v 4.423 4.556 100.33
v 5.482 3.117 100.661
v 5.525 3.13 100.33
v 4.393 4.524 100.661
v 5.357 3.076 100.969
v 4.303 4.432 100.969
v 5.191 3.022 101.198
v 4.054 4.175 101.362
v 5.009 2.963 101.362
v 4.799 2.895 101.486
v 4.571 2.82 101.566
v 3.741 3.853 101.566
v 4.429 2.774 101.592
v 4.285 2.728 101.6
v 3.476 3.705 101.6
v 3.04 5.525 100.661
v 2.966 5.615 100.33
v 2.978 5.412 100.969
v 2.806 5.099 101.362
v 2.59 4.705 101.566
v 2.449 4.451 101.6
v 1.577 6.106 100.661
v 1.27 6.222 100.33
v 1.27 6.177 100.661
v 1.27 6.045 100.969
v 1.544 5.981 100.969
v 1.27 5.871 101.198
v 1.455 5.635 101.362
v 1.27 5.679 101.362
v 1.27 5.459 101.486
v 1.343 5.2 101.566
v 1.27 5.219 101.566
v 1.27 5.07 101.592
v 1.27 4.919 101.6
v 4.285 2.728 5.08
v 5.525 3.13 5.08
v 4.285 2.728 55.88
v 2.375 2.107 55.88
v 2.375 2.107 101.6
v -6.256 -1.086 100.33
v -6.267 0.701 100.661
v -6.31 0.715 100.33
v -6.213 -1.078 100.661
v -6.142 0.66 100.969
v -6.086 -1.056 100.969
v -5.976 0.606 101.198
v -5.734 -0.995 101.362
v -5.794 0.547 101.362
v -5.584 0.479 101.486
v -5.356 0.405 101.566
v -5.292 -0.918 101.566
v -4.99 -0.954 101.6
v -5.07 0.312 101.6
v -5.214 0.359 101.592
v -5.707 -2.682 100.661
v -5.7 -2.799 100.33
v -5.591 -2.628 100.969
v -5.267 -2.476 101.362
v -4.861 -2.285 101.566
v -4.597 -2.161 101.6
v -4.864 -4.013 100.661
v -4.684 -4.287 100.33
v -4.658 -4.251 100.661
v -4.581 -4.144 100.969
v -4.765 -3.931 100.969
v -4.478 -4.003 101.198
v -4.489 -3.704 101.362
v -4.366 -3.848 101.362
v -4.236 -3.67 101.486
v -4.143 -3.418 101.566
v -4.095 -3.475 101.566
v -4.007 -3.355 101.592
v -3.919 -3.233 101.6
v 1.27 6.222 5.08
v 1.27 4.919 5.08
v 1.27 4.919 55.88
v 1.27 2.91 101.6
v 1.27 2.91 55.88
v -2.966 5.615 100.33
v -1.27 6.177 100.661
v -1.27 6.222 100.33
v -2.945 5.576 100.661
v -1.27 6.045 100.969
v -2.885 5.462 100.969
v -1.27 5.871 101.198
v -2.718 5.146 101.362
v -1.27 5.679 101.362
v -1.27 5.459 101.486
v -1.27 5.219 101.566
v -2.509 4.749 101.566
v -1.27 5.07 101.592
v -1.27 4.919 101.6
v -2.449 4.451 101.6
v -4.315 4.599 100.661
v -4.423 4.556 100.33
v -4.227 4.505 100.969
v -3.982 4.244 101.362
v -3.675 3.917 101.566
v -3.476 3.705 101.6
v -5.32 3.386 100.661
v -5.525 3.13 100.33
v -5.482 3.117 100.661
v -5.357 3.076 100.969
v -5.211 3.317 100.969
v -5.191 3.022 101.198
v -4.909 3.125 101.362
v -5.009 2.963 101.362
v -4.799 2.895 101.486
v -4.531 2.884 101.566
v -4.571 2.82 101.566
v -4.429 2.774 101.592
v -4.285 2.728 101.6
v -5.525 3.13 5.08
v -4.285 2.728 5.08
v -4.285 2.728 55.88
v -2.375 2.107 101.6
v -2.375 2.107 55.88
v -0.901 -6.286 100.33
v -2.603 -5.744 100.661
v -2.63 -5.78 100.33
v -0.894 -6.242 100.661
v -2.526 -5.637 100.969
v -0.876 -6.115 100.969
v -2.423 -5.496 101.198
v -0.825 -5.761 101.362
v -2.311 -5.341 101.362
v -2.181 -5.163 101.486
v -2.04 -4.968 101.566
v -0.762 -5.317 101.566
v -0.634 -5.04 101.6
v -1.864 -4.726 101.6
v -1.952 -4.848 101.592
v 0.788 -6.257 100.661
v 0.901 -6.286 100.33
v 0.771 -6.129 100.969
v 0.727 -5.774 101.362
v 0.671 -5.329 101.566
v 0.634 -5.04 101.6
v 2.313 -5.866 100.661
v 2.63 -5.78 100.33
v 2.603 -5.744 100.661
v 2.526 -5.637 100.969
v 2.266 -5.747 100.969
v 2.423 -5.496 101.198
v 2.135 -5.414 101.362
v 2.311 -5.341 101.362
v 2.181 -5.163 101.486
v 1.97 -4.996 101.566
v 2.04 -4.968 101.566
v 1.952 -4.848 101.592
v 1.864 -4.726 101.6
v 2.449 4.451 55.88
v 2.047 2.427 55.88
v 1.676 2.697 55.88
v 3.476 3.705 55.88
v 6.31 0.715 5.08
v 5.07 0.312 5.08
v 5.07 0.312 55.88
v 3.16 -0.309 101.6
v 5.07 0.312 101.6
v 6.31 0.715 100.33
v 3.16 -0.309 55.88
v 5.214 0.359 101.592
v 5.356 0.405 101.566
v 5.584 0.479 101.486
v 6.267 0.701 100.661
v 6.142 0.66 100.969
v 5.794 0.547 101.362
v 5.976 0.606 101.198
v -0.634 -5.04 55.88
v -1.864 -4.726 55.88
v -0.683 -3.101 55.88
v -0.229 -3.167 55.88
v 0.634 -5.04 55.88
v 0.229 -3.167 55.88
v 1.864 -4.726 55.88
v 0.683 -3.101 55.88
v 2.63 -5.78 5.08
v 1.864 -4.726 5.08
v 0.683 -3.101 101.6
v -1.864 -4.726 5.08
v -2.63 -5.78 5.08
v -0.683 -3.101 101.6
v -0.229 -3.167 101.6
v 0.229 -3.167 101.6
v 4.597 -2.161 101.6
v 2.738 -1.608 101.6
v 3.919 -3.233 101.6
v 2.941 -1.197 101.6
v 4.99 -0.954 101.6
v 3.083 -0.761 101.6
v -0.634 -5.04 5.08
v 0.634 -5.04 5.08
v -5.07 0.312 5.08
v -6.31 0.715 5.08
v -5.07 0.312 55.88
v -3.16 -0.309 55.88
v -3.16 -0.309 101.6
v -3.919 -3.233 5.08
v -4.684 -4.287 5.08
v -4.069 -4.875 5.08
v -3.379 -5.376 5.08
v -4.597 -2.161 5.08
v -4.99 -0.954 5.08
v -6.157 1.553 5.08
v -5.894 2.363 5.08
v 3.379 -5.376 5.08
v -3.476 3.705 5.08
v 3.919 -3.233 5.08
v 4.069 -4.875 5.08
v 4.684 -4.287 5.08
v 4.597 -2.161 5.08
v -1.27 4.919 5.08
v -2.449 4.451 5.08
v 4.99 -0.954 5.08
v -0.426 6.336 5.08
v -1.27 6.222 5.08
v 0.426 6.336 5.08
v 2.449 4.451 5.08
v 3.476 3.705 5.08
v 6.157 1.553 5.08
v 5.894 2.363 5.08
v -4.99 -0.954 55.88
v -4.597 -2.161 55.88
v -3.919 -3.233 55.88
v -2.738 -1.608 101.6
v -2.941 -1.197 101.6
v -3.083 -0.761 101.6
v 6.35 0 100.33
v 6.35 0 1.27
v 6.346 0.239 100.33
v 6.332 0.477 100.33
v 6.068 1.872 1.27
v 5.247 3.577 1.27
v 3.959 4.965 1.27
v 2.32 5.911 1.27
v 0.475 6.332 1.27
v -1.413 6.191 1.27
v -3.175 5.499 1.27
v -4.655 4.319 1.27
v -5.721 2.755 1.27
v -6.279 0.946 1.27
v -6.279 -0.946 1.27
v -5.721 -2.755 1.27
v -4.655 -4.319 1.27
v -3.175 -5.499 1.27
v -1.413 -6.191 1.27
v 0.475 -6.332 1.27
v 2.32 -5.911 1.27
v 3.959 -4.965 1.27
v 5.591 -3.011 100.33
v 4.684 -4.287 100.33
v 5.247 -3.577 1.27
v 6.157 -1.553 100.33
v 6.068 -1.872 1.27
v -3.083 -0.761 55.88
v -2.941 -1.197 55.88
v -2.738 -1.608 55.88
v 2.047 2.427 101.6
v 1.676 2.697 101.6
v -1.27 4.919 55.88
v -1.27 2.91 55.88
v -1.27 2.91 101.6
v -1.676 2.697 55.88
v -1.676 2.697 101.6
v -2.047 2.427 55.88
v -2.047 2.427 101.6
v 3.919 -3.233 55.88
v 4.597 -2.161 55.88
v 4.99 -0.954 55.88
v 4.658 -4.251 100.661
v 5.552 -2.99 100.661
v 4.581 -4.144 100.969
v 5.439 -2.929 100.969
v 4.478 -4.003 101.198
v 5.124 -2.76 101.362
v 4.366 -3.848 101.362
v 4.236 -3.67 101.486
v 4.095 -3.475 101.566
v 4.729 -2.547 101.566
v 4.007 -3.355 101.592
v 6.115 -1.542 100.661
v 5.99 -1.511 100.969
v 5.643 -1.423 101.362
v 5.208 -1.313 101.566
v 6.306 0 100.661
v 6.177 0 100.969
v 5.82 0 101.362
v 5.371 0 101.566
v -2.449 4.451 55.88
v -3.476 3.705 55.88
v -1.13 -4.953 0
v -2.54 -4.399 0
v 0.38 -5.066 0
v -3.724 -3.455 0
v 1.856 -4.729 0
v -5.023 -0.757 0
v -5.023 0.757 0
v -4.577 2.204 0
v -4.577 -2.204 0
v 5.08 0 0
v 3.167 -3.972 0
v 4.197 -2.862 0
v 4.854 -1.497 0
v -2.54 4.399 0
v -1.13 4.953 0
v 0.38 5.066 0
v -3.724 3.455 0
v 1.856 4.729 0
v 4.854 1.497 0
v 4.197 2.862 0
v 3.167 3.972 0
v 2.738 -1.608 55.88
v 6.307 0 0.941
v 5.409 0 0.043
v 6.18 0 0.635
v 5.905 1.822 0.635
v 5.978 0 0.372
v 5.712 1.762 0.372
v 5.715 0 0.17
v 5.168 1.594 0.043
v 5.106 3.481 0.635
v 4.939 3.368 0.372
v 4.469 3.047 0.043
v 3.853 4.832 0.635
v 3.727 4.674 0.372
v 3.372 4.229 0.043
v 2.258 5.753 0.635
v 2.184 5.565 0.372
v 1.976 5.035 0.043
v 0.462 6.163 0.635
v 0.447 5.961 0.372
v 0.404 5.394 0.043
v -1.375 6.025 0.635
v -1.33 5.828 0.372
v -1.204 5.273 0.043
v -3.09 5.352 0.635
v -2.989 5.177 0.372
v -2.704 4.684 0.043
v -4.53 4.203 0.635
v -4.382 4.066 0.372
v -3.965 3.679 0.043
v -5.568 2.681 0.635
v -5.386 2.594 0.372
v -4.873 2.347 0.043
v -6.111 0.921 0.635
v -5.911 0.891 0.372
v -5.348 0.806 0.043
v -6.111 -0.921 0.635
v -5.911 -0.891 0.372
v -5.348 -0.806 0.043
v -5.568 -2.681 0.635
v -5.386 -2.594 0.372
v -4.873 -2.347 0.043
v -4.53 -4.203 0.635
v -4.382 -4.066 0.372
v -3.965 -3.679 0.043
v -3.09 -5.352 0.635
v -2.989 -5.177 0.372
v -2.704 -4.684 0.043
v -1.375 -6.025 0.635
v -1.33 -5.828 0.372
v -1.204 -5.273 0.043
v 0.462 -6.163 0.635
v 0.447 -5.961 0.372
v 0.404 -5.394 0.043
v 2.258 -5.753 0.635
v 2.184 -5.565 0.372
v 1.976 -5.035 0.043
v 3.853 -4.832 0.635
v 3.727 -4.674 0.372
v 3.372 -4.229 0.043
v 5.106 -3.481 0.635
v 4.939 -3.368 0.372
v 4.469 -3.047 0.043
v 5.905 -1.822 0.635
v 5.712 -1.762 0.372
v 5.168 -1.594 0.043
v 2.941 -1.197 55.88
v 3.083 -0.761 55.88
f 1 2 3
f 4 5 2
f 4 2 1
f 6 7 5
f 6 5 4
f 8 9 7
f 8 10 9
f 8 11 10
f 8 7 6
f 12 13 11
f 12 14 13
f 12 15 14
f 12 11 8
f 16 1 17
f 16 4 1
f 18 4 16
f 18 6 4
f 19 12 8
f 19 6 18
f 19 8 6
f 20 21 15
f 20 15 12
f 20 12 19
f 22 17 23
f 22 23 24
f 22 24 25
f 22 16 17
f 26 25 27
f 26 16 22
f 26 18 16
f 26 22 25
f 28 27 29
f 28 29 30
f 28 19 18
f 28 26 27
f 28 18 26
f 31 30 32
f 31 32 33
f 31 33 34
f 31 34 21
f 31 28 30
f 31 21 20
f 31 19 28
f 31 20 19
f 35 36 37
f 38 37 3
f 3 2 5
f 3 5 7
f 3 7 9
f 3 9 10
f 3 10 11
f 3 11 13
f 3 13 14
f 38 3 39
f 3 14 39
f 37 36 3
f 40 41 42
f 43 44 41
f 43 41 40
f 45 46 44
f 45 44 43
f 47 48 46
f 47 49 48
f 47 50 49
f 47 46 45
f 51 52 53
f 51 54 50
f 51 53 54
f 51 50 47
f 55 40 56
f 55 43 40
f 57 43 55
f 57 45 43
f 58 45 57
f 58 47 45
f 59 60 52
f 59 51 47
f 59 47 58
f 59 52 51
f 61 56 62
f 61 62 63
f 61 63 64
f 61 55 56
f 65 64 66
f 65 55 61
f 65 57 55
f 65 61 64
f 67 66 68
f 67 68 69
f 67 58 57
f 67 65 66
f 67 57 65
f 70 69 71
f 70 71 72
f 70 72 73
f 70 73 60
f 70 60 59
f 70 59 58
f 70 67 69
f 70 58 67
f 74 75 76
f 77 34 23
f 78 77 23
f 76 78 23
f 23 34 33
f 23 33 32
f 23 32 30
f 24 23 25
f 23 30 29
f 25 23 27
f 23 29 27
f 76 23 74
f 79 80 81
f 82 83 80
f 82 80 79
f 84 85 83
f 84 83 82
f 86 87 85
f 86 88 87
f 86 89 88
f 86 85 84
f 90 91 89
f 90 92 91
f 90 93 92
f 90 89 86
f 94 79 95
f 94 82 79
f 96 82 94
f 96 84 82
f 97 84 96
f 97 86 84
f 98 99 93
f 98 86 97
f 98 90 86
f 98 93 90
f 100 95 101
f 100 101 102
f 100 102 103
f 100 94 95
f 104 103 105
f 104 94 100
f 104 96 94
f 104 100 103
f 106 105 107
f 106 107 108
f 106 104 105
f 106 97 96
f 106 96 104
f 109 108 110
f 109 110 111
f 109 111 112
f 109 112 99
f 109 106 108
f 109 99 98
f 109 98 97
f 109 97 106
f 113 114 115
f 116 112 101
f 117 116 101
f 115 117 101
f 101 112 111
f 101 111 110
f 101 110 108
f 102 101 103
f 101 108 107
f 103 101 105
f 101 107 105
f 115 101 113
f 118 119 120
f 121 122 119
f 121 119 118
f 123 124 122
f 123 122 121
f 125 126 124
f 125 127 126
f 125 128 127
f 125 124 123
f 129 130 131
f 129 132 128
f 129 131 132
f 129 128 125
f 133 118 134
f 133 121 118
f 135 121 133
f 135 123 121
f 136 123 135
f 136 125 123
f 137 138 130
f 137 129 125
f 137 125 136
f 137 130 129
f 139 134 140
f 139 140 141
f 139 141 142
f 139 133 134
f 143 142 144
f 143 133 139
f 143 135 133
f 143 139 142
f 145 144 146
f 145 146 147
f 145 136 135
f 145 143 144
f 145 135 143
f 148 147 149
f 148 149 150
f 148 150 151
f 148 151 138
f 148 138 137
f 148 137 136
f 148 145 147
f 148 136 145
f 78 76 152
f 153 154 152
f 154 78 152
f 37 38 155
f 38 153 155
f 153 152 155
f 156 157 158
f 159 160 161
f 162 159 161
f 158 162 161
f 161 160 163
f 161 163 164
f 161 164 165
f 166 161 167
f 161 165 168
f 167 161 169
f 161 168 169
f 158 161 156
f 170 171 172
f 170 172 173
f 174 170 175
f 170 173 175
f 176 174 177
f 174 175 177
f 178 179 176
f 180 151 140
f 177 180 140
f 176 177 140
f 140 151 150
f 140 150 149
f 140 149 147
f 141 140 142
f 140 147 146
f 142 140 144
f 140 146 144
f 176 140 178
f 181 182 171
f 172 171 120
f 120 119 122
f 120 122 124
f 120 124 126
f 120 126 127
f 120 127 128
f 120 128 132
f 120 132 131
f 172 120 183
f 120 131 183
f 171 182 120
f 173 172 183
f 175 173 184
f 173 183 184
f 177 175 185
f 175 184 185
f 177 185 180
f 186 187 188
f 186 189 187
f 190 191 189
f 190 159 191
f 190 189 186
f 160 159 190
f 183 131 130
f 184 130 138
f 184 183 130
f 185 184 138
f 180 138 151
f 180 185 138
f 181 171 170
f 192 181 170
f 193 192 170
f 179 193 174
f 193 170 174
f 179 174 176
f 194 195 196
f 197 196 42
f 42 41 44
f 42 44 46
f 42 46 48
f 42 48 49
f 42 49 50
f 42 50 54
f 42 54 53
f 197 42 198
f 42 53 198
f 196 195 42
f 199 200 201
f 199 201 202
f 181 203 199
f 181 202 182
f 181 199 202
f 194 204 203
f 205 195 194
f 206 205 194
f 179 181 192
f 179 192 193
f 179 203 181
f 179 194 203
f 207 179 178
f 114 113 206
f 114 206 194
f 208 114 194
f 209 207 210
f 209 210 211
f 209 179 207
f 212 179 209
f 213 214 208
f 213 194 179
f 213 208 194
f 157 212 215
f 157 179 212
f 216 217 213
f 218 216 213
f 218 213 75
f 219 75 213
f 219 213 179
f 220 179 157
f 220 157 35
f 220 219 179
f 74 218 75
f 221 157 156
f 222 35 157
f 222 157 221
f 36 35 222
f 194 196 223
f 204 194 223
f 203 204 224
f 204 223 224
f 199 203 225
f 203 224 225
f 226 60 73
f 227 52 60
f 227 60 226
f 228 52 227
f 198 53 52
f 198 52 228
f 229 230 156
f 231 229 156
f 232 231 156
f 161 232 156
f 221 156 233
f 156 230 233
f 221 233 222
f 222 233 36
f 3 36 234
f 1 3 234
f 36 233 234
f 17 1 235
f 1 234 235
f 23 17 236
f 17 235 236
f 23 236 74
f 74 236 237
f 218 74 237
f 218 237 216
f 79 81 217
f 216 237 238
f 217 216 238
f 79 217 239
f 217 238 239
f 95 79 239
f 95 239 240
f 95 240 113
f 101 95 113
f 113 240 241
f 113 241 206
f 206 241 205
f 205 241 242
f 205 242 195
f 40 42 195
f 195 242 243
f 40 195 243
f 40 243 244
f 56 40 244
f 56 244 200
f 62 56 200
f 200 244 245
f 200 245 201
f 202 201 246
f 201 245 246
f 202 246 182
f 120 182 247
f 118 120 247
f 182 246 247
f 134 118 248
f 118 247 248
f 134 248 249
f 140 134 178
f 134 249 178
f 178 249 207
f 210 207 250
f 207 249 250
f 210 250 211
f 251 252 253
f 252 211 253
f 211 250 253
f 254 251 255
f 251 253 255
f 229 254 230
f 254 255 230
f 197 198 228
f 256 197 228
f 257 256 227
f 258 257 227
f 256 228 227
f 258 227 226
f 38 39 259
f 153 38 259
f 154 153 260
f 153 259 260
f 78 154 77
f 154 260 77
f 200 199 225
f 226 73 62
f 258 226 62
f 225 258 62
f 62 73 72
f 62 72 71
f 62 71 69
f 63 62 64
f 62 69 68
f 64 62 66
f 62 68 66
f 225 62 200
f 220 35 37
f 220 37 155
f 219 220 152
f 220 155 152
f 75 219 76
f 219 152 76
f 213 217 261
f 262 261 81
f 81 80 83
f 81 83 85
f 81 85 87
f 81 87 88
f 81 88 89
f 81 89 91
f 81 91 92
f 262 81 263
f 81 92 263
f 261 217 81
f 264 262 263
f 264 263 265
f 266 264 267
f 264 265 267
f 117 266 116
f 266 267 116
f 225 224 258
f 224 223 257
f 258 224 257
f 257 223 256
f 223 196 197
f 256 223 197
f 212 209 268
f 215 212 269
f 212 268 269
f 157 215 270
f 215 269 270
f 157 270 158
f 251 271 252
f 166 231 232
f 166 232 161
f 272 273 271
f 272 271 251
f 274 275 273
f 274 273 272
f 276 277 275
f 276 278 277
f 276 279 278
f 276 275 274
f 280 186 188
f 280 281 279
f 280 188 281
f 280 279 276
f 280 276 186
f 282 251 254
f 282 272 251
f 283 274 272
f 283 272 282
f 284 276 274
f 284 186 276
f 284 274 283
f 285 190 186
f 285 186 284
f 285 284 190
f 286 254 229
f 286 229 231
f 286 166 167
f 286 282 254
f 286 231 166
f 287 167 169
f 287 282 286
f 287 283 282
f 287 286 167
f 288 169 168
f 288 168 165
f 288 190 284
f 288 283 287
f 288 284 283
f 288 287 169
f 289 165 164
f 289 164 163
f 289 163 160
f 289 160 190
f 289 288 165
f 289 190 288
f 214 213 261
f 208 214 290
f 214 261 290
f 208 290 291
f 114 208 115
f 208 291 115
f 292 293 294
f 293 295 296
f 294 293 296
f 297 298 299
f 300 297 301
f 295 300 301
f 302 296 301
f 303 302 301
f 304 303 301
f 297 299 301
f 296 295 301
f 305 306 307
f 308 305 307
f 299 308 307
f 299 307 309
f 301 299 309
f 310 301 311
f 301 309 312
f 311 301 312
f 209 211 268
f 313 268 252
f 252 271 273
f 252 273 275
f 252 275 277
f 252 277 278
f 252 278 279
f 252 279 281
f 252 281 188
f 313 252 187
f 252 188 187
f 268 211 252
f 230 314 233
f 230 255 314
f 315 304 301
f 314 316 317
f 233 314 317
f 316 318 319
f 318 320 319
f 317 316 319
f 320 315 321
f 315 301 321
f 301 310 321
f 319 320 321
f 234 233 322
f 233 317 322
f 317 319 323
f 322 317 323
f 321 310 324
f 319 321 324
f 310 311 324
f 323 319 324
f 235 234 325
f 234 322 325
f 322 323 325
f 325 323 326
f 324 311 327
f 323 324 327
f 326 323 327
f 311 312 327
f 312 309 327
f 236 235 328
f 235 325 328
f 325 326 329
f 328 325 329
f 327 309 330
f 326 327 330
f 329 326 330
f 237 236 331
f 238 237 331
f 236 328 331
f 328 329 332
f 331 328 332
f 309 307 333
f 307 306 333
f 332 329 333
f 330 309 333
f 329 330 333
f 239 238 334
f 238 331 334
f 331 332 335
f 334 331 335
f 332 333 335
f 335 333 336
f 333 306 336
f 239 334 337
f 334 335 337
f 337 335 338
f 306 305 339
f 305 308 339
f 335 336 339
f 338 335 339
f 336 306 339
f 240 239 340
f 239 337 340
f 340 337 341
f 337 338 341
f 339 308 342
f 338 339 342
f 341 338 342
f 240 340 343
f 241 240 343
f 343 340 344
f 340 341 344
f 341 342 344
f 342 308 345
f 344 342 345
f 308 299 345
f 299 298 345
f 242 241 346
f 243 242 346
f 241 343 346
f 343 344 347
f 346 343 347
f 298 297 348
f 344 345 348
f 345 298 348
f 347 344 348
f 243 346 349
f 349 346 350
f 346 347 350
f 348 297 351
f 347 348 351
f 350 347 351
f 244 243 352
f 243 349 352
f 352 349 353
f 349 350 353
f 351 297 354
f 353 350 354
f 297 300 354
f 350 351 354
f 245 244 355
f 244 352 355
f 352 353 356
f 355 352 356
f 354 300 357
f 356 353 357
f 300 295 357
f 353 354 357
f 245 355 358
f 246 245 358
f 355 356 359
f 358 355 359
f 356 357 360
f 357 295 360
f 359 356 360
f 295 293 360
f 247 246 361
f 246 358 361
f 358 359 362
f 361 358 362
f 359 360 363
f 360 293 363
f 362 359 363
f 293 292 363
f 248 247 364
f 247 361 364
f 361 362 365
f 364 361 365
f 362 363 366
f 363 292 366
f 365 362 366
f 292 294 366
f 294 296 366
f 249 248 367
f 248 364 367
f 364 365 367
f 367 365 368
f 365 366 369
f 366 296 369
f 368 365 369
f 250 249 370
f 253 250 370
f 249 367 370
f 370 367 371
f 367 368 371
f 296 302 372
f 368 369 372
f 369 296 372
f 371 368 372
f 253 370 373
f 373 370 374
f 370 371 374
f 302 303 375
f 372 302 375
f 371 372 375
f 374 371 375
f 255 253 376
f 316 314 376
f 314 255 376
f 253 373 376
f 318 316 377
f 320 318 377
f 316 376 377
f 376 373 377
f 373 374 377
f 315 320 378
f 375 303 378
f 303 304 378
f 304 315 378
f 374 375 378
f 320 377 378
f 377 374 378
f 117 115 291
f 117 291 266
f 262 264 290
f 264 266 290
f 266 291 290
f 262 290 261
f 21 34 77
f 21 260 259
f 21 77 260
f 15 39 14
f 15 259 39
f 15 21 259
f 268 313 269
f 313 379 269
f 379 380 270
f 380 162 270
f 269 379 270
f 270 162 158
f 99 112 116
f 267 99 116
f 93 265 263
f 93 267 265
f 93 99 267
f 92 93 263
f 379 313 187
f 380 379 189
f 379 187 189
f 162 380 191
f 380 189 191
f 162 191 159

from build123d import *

# Parameters (mm, degrees)
SKETCH1_R           = 6.35
BOSS_EXTRUDE1_DEPTH = 101.6
FILLET1_R           = 1.27
SKETCH2_R           = 3.175
CUT_EXTRUDE1_DEPTH  = 45.72
SKETCH3_R           = 5.08
CUT_EXTRUDE2_DEPTH  = 50.8
FILLET2_R           = 1.27
CUT_EXTRUDE3_DEPTH  = 96.52


with BuildPart() as part:
    # Sketch1 → Boss-Extrude1 (new body)
    with BuildSketch(Plane.XY):
        Circle(SKETCH1_R)
    extrude(amount=BOSS_EXTRUDE1_DEPTH)

    # Fillet1
    fillet1_edges = [part.edges().sort_by_distance(p)[0] for p in [
        (-6.35, 0, 0),
    ]]
    fillet(fillet1_edges, radius=FILLET1_R)

    # Sketch2 → Cut-Extrude1 (cut)
    with BuildSketch(Plane.XY.offset(101.6)):
        Circle(SKETCH2_R)
    extrude(amount=-CUT_EXTRUDE1_DEPTH, mode=Mode.SUBTRACT)

    # Sketch3 → Cut-Extrude2 (cut)
    with BuildSketch(Plane.XY.offset(55.88)):
        Circle(SKETCH3_R)
    extrude(amount=-CUT_EXTRUDE2_DEPTH, mode=Mode.SUBTRACT)

    # Fillet2
    fillet2_edges = [part.edges().sort_by_distance(p)[0] for p in [
        (-6.35, 0, 101.6),
    ]]
    fillet(fillet2_edges, radius=FILLET2_R)

    # Sketch4 → Cut-Extrude3 (cut)
    with BuildSketch(Plane.XY.offset(101.6)):
        with BuildLine():
            Line((-1.27, 6.221703947), (-1.27, 2.909935566))
            Line((-1.27, 2.909935566), (1.27, 2.909935566))
            Line((1.27, 2.909935566), (1.27, 6.221703947))
            ThreePointArc((1.27, 6.221703947), (0, 6.35), (-1.27, 6.221703947))
        make_face()
        with BuildLine():
            Line((2.375061599, 2.107061318), (3.159964765, -0.308622233))
            Line((3.159964765, -0.308622233), (6.309643664, 0.714770478))
            ThreePointArc((6.309643664, 0.714770478), (6.039208878, 1.962257914), (5.524740498, 3.130454029))
            Line((5.524740498, 3.130454029), (2.375061599, 2.107061318))
        make_face()
        with BuildLine():
            Line((2.737868794, -1.607700055), (0.682965628, -3.100674596))
            Line((0.682965628, -3.100674596), (2.629574241, -5.779951497))
            ThreePointArc((2.629574241, -5.779951497), (3.732436352, -5.137257914), (4.684477407, -4.286976956))
            Line((4.684477407, -4.286976956), (2.737868794, -1.607700055))
        make_face()
        with BuildLine():
            Line((-0.682965628, -3.100674596), (-2.737868794, -1.607700055))
            Line((-2.737868794, -1.607700055), (-4.684477407, -4.286976956))
            ThreePointArc((-4.684477407, -4.286976956), (-3.732436352, -5.137257914), (-2.629574241, -5.779951497))
            Line((-2.629574241, -5.779951497), (-0.682965628, -3.100674596))
        make_face()
        with BuildLine():
            Line((-3.159964765, -0.308622233), (-2.375061599, 2.107061318))
            Line((-2.375061599, 2.107061318), (-5.524740498, 3.130454029))
            ThreePointArc((-5.524740498, 3.130454029), (-6.039208878, 1.962257914), (-6.309643664, 0.714770478))
            Line((-6.309643664, 0.714770478), (-3.159964765, -0.308622233))
        make_face()
    extrude(amount=-CUT_EXTRUDE3_DEPTH, mode=Mode.SUBTRACT)


solid = part.part
